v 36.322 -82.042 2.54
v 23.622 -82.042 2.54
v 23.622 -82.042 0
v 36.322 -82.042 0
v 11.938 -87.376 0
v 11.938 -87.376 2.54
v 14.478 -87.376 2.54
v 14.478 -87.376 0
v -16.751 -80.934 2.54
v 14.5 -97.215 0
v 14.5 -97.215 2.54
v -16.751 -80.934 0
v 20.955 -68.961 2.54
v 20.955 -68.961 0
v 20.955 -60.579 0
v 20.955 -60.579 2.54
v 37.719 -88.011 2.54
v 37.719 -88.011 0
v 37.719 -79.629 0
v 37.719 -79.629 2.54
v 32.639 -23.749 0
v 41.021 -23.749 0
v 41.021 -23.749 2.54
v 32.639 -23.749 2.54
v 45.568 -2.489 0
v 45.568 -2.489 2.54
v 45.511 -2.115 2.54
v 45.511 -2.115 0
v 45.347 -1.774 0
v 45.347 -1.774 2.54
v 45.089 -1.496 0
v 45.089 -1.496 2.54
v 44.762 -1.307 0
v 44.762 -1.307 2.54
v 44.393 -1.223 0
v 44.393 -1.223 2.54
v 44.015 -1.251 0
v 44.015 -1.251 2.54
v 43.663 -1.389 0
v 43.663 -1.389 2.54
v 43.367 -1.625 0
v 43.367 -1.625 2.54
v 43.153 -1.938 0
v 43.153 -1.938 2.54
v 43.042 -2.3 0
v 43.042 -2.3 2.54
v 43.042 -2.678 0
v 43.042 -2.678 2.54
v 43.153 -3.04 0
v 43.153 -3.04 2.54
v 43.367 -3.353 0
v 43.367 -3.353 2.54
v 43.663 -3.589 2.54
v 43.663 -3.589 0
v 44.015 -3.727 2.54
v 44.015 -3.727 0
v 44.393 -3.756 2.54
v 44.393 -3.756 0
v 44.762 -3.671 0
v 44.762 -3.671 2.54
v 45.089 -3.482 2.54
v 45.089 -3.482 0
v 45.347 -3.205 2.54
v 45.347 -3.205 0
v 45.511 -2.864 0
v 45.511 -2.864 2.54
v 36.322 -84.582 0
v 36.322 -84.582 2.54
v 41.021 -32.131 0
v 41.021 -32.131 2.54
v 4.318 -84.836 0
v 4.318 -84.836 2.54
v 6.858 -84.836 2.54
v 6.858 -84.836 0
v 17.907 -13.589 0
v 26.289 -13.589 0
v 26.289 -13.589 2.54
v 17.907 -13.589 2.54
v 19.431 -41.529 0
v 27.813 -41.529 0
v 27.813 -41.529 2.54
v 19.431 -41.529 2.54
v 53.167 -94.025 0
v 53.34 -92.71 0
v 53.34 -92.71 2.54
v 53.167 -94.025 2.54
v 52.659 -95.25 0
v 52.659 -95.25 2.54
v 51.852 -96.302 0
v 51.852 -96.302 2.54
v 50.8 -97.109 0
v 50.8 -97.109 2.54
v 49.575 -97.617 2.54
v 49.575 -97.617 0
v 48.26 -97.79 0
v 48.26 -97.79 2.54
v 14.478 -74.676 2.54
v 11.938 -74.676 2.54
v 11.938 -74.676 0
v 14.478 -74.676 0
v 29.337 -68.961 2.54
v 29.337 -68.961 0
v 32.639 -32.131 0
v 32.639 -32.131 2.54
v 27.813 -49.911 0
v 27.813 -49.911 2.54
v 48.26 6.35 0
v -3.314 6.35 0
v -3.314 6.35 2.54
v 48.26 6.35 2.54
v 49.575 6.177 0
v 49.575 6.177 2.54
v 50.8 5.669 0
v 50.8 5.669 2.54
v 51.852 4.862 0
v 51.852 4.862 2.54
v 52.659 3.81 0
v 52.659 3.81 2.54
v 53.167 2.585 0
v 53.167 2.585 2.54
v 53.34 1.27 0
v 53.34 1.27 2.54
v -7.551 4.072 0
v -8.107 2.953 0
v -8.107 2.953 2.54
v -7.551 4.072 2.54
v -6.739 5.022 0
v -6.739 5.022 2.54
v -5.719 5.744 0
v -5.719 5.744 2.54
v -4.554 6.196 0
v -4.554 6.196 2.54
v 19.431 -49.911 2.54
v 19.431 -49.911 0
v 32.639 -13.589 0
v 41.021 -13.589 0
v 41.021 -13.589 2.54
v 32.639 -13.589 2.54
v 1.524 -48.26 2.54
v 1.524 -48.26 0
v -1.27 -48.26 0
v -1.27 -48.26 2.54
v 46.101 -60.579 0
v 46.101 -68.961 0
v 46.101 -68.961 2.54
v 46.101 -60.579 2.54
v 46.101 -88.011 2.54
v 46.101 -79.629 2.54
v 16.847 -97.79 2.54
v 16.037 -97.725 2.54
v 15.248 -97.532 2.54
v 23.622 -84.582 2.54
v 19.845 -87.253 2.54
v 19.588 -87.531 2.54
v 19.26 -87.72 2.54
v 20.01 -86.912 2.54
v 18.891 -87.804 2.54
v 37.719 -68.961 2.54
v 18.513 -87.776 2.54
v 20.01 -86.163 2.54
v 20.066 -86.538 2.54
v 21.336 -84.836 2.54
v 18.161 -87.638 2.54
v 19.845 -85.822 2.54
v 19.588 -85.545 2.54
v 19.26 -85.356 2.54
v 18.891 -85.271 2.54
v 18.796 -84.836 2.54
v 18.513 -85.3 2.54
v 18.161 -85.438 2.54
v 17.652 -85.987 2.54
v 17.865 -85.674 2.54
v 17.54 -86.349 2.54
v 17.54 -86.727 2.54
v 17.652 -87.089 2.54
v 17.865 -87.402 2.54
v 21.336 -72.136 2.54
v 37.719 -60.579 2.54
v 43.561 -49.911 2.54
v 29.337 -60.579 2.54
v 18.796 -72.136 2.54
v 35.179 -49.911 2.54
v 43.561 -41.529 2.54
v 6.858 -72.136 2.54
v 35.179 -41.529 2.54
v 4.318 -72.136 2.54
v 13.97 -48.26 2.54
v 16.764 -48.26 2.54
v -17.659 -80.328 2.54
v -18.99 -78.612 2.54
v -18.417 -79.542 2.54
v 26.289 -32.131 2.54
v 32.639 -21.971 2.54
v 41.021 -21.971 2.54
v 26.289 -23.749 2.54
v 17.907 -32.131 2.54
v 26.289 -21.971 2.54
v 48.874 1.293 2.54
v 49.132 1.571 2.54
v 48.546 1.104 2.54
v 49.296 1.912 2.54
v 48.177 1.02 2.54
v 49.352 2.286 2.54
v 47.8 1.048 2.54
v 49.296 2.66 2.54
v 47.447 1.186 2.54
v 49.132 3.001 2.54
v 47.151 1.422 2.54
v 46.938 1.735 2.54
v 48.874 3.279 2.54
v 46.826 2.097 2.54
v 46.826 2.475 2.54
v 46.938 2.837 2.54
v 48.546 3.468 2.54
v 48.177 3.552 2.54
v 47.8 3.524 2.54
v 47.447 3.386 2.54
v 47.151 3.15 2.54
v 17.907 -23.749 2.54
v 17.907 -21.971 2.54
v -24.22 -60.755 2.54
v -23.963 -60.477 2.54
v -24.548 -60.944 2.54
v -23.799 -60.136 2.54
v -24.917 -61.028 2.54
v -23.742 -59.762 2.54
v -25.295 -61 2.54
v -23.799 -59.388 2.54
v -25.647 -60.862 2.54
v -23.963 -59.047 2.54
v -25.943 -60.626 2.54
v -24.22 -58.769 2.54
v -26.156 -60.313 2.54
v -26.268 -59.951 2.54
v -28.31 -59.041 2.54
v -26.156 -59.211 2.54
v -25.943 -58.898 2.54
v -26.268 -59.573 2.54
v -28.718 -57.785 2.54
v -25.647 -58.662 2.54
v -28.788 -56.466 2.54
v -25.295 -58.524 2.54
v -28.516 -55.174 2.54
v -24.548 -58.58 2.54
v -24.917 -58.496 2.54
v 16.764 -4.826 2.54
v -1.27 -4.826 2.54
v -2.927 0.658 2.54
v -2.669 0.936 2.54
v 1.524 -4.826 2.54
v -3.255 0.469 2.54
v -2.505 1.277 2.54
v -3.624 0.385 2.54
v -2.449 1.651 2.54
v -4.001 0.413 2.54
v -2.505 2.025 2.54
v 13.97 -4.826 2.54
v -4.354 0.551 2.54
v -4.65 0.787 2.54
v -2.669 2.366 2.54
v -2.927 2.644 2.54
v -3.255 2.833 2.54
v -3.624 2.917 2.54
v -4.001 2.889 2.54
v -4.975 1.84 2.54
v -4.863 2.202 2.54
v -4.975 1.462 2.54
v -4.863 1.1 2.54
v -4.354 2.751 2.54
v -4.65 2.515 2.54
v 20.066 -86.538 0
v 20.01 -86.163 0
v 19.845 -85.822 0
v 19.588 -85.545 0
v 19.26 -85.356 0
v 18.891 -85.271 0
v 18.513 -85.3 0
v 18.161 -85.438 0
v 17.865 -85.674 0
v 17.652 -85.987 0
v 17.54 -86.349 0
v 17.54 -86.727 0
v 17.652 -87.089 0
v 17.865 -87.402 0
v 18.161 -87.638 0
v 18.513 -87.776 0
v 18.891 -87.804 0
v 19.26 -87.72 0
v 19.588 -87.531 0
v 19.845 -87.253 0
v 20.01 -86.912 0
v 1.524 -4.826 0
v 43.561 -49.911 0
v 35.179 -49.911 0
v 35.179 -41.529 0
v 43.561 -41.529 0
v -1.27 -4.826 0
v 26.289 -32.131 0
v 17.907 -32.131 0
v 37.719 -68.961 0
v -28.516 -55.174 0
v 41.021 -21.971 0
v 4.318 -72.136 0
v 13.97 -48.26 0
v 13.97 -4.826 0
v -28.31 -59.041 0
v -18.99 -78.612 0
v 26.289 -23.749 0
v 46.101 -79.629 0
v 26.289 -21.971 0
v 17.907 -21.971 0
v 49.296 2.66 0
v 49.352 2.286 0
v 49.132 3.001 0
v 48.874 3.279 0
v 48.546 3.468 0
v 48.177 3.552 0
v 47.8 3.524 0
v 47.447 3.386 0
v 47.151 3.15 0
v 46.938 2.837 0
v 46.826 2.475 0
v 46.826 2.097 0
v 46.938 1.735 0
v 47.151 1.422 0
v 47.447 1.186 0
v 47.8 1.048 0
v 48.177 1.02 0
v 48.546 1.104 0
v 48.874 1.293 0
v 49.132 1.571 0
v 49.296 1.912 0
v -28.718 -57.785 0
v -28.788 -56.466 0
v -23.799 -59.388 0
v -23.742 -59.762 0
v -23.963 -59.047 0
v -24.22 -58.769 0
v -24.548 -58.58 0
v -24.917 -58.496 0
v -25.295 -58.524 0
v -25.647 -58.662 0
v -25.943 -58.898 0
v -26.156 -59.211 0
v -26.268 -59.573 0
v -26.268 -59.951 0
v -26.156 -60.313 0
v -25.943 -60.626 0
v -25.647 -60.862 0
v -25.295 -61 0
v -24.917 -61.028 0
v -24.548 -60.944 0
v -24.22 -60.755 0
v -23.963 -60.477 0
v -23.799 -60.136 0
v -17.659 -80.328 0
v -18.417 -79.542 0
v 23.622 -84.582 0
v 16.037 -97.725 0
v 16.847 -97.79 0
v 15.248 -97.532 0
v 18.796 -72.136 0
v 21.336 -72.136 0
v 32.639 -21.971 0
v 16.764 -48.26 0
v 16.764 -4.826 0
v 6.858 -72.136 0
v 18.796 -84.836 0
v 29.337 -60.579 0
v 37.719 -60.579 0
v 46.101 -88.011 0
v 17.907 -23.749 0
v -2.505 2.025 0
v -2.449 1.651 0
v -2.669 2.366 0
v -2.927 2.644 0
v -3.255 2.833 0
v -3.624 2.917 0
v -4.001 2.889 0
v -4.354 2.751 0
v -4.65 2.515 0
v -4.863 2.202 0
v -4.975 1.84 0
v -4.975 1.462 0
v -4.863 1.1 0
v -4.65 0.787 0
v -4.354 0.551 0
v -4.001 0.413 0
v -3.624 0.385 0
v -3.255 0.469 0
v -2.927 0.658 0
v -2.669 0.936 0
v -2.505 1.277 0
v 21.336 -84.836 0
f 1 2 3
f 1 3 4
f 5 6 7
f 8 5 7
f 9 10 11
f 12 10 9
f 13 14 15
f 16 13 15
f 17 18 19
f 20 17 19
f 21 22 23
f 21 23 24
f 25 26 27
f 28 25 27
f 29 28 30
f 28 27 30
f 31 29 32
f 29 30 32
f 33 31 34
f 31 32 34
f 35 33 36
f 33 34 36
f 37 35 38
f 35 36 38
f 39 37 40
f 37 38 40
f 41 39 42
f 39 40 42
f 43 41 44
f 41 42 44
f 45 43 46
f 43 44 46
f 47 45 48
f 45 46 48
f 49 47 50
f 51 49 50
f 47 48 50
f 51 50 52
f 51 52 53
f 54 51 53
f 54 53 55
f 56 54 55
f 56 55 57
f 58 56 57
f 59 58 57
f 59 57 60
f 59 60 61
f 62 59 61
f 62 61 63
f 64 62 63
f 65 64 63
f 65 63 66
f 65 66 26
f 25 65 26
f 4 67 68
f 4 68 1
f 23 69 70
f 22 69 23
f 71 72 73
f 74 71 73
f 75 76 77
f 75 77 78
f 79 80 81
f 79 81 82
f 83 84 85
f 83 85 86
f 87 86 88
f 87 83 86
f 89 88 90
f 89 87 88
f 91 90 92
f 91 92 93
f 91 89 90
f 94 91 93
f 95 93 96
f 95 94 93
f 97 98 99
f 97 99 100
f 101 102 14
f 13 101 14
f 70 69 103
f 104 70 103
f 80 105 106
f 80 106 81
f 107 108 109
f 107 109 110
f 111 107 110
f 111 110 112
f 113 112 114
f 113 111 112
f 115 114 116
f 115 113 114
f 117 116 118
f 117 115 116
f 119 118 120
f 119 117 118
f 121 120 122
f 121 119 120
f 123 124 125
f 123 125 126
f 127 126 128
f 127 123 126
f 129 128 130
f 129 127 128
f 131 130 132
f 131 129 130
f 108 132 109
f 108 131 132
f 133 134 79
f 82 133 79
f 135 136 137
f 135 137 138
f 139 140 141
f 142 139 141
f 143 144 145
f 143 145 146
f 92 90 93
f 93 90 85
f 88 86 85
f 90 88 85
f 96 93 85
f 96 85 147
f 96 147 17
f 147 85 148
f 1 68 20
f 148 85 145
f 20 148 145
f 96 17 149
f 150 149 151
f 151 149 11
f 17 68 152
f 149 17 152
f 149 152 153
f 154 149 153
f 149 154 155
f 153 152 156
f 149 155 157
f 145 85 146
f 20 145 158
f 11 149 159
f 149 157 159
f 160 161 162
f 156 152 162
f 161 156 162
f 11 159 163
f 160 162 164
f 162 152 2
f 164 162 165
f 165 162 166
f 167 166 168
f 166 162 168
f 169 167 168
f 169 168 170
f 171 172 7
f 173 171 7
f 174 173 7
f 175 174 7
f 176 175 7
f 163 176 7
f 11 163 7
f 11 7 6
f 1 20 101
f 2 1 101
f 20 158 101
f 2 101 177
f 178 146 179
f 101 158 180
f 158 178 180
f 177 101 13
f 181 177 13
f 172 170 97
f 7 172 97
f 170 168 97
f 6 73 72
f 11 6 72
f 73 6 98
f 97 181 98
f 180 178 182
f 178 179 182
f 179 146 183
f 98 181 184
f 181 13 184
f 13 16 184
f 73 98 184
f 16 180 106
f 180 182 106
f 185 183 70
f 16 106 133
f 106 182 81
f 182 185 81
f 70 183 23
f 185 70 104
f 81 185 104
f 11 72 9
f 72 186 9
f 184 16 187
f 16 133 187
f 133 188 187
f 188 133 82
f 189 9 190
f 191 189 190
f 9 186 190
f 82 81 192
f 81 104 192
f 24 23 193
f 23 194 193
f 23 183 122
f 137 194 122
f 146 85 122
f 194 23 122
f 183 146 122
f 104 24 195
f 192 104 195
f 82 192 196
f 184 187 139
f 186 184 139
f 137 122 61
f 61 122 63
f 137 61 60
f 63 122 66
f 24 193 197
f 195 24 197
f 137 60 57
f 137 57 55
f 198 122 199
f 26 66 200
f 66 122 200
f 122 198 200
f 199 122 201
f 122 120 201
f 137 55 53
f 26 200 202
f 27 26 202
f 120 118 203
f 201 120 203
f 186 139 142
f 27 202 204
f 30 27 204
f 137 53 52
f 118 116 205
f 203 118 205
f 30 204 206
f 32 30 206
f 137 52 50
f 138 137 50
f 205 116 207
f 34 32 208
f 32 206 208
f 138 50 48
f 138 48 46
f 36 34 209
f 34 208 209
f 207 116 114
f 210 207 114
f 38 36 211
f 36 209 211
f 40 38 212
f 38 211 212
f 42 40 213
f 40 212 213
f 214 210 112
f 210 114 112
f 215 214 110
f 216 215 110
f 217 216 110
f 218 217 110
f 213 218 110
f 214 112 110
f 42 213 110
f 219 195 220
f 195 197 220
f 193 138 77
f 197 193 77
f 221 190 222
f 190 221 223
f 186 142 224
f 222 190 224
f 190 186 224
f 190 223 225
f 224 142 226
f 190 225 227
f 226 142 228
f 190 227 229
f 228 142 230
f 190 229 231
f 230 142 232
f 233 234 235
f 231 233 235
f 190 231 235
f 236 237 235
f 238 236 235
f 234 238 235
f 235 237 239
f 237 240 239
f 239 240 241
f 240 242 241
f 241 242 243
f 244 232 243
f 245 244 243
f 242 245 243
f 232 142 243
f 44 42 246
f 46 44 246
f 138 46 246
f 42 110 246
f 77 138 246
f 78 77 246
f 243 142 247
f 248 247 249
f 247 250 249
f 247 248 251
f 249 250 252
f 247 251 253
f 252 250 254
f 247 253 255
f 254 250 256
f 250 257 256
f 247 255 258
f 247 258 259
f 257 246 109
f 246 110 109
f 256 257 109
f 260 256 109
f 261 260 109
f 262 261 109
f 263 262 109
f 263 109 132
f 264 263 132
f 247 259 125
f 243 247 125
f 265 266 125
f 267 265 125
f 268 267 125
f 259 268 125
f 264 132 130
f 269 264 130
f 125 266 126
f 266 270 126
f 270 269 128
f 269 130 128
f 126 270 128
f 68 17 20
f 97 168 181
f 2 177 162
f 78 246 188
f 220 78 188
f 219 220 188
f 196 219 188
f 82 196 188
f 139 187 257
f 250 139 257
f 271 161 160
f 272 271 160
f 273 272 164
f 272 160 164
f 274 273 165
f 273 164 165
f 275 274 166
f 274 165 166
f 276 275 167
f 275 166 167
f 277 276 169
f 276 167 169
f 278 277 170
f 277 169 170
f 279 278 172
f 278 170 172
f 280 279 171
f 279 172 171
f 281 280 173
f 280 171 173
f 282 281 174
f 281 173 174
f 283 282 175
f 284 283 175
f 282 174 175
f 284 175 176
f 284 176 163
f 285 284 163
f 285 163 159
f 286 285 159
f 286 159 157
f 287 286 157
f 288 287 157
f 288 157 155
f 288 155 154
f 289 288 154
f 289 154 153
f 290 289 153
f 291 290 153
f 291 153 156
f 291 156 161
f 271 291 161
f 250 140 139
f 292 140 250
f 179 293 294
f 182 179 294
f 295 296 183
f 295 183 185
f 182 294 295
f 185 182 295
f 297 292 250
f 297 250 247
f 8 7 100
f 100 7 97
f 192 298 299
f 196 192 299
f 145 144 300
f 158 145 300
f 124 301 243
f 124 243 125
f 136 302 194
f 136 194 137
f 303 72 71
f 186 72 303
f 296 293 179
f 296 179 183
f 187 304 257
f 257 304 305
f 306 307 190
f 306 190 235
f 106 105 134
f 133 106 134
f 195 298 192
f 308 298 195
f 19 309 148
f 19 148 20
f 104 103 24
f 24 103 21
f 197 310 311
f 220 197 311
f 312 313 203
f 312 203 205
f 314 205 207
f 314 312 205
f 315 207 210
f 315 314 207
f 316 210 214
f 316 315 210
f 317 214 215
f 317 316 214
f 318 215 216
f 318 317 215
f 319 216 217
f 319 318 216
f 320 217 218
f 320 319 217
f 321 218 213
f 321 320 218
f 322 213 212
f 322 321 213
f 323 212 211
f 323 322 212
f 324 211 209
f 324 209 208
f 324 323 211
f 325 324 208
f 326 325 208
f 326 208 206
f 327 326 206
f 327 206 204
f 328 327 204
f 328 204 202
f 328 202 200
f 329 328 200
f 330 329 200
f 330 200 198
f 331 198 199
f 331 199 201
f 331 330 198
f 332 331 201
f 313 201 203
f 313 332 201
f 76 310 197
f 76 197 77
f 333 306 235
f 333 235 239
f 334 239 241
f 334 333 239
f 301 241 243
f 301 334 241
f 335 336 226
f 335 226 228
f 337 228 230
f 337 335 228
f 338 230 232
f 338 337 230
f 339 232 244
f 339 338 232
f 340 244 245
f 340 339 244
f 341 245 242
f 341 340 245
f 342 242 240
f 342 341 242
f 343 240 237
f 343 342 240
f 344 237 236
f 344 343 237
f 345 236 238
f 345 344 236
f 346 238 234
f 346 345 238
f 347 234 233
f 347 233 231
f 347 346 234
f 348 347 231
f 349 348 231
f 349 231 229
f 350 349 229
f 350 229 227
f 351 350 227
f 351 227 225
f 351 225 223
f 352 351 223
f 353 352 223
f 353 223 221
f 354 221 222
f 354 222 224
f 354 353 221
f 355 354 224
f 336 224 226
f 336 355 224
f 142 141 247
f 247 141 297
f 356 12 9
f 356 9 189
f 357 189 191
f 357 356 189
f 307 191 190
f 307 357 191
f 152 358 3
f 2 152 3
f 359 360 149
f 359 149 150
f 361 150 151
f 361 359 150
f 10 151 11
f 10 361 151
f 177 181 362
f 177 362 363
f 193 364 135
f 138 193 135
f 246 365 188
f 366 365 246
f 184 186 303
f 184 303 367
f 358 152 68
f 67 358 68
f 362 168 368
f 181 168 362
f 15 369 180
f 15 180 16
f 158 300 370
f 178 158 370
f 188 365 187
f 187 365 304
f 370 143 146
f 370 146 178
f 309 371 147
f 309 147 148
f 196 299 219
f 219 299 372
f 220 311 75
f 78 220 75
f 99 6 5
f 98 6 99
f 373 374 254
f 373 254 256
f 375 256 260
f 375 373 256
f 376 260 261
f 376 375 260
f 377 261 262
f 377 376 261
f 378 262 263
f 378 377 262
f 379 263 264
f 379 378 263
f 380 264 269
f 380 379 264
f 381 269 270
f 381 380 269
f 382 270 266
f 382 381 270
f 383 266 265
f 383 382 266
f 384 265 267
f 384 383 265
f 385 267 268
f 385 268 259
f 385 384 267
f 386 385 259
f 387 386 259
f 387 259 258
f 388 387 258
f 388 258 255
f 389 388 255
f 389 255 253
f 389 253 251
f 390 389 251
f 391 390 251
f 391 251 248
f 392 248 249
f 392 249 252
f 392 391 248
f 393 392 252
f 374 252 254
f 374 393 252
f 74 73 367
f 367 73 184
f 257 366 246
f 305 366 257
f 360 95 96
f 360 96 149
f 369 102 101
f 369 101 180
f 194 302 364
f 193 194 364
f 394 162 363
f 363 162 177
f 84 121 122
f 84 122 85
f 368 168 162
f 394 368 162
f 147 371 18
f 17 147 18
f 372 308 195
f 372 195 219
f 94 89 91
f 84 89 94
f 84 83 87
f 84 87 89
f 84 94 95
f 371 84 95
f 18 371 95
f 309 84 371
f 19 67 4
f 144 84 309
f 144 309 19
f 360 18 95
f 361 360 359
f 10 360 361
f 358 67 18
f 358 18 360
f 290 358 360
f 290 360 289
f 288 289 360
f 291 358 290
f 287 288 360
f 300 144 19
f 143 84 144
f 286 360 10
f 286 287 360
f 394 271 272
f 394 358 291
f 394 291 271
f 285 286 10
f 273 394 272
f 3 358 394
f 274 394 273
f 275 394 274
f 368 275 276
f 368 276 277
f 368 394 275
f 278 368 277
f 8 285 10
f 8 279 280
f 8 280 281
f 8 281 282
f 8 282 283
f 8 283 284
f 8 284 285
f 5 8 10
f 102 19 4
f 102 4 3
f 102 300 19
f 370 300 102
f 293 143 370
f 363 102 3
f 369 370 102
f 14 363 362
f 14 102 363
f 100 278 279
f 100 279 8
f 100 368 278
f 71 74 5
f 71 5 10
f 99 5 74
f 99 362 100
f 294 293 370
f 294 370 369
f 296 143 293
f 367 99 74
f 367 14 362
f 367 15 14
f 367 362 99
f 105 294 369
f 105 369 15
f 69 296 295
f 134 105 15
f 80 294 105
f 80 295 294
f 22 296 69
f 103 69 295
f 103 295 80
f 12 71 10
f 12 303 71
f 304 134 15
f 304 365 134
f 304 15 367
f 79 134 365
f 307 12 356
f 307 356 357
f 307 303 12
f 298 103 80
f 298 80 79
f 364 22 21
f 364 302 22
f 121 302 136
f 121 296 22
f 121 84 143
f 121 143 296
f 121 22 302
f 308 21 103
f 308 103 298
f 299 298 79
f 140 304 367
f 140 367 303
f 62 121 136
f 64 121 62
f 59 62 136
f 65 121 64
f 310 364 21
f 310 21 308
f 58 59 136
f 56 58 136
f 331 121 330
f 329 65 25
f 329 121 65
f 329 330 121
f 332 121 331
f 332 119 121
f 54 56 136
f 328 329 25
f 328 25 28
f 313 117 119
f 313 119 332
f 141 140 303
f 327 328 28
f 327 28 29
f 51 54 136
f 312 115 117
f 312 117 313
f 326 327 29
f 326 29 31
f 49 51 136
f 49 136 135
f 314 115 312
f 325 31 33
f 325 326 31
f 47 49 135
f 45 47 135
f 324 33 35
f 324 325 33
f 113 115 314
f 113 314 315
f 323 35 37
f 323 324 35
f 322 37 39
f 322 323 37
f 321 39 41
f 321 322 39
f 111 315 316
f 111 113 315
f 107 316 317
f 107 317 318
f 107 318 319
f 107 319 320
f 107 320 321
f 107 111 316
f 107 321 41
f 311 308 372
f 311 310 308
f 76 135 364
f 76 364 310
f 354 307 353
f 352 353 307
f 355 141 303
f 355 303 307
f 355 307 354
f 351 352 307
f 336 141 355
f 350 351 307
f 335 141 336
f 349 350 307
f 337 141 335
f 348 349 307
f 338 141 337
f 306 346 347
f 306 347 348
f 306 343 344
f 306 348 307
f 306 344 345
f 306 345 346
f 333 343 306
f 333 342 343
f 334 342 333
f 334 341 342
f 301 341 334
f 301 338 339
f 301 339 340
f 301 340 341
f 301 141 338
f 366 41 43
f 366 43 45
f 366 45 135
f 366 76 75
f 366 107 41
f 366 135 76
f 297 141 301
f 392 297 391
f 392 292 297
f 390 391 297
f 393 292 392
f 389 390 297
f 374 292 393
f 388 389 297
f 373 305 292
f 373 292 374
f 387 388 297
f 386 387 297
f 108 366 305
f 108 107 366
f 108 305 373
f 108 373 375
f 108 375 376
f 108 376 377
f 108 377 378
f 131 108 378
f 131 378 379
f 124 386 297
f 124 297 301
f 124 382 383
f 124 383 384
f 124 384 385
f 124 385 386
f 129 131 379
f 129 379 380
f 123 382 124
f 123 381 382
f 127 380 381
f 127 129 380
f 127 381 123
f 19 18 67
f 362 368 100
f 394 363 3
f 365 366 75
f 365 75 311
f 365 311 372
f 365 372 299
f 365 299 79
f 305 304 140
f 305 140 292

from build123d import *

# Parameters (mm, degrees)
SKETCH1_R           = 1.27
BOSS_EXTRUDE1_DEPTH = 2.54
SKETCH5_W           = 8.382
SKETCH5_H           = 8.382
SKETCH5_W_2         = 2.794
SKETCH5_H_2         = 43.434
CUT_EXTRUDE1_DEPTH  = 3.54
SKETCH7_R           = 1.27
CUT_EXTRUDE3_DEPTH  = 3.54
SKETCH8_W           = 12.7
SKETCH8_H           = 2.54
SKETCH8_W_2         = 2.54
SKETCH8_H_2         = 12.7
CUT_EXTRUDE4_DEPTH  = 3.54


with BuildPart() as part:
    # Sketch1 → Boss-Extrude1 (new body)
    with BuildSketch(Plane.XY):
        with BuildLine():
            Line((-3.314058103, 6.35), (48.26, 6.35))
            ThreePointArc((48.26, 6.35), (51.852102448, 4.862102448), (53.34, 1.27))
            Line((53.34, 1.27), (53.34, -92.71))
            ThreePointArc((53.34, -92.71), (51.852102448, -96.302102448), (48.26, -97.79))
            Line((48.26, -97.79), (16.846989059, -97.79))
            ThreePointArc((16.846989059, -97.79), (15.638688158, -97.644208035), (14.499741809, -97.215200367))
            Line((14.499741809, -97.215200367), (-16.7505185, -80.933552139))
            ThreePointArc((-16.7505185, -80.933552139), (-18.059258376, -79.955412607), (-18.989802686, -78.61241436))
            Line((-18.989802686, -78.61241436), (-28.309569459, -59.040904135))
            ThreePointArc((-28.309569459, -59.040904135), (-28.795802898, -57.127870198), (-28.51617555, -55.173917704))
            Line((-28.51617555, -55.173917704), (-8.107195629, 2.952923842))
            ThreePointArc((-8.107195629, 2.952923842), (-6.251501454, 5.414614163), (-3.314058103, 6.35))
        make_face()
        with Locations((48.0822, 2.286)):
            Circle(SKETCH1_R, mode=Mode.SUBTRACT)
        with Locations((-3.718687848, 1.651)):
            Circle(SKETCH1_R, mode=Mode.SUBTRACT)
        with Locations((-25.012261453, -59.761967182)):
            Circle(SKETCH1_R, mode=Mode.SUBTRACT)
    extrude(amount=BOSS_EXTRUDE1_DEPTH)

    # Sketch5 → Cut-Extrude1 (cut, through all)
    with BuildSketch(Plane(origin=(0, 0, 0), x_dir=(-1, 0, 0), z_dir=(0, 0, -1))):
        with Locations((-36.83, -17.78)):
            Rectangle(SKETCH5_W, SKETCH5_H)
        with Locations((-39.37, -45.72)):
            Rectangle(SKETCH5_W, SKETCH5_H)
        with Locations((-36.83, -27.94)):
            Rectangle(SKETCH5_W, SKETCH5_H)
        with Locations((-41.91, -64.77)):
            Rectangle(SKETCH5_W, SKETCH5_H)
        with Locations((-41.91, -83.82)):
            Rectangle(SKETCH5_W, SKETCH5_H)
        with Locations((-22.098, -17.78)):
            Rectangle(SKETCH5_W, SKETCH5_H)
        with Locations((-22.098, -27.94)):
            Rectangle(SKETCH5_W, SKETCH5_H)
        with Locations((-23.622, -45.72)):
            Rectangle(SKETCH5_W, SKETCH5_H)
        with Locations((-25.146, -64.77)):
            Rectangle(SKETCH5_W, SKETCH5_H)
        with Locations((-15.367, -26.543)):
            Rectangle(SKETCH5_W_2, SKETCH5_H_2)
        with Locations((-0.127, -26.543)):
            Rectangle(SKETCH5_W_2, SKETCH5_H_2)
    extrude(amount=-CUT_EXTRUDE1_DEPTH, mode=Mode.SUBTRACT)

    # Sketch7 → Cut-Extrude3 (cut, through all)
    with BuildSketch(Plane.XY.offset(2.54)):
        with Locations((44.2976, -2.4892)):
            Circle(SKETCH7_R)
        with Locations((18.796, -86.5378)):
            Circle(SKETCH7_R)
    extrude(amount=-CUT_EXTRUDE3_DEPTH, mode=Mode.SUBTRACT)

    # Sketch8 → Cut-Extrude4 (cut, through all)
    with BuildSketch(Plane.XY.offset(2.54)):
        with Locations((29.972, -83.312)):
            Rectangle(SKETCH8_W, SKETCH8_H)
        with Locations((20.066, -78.486)):
            Rectangle(SKETCH8_W_2, SKETCH8_H_2)
        with Locations((13.208, -81.026)):
            Rectangle(SKETCH8_W_2, SKETCH8_H_2)
        with Locations((5.588, -78.486)):
            Rectangle(SKETCH8_W_2, SKETCH8_H_2)
    extrude(amount=-CUT_EXTRUDE4_DEPTH, mode=Mode.SUBTRACT)


solid = part.part
